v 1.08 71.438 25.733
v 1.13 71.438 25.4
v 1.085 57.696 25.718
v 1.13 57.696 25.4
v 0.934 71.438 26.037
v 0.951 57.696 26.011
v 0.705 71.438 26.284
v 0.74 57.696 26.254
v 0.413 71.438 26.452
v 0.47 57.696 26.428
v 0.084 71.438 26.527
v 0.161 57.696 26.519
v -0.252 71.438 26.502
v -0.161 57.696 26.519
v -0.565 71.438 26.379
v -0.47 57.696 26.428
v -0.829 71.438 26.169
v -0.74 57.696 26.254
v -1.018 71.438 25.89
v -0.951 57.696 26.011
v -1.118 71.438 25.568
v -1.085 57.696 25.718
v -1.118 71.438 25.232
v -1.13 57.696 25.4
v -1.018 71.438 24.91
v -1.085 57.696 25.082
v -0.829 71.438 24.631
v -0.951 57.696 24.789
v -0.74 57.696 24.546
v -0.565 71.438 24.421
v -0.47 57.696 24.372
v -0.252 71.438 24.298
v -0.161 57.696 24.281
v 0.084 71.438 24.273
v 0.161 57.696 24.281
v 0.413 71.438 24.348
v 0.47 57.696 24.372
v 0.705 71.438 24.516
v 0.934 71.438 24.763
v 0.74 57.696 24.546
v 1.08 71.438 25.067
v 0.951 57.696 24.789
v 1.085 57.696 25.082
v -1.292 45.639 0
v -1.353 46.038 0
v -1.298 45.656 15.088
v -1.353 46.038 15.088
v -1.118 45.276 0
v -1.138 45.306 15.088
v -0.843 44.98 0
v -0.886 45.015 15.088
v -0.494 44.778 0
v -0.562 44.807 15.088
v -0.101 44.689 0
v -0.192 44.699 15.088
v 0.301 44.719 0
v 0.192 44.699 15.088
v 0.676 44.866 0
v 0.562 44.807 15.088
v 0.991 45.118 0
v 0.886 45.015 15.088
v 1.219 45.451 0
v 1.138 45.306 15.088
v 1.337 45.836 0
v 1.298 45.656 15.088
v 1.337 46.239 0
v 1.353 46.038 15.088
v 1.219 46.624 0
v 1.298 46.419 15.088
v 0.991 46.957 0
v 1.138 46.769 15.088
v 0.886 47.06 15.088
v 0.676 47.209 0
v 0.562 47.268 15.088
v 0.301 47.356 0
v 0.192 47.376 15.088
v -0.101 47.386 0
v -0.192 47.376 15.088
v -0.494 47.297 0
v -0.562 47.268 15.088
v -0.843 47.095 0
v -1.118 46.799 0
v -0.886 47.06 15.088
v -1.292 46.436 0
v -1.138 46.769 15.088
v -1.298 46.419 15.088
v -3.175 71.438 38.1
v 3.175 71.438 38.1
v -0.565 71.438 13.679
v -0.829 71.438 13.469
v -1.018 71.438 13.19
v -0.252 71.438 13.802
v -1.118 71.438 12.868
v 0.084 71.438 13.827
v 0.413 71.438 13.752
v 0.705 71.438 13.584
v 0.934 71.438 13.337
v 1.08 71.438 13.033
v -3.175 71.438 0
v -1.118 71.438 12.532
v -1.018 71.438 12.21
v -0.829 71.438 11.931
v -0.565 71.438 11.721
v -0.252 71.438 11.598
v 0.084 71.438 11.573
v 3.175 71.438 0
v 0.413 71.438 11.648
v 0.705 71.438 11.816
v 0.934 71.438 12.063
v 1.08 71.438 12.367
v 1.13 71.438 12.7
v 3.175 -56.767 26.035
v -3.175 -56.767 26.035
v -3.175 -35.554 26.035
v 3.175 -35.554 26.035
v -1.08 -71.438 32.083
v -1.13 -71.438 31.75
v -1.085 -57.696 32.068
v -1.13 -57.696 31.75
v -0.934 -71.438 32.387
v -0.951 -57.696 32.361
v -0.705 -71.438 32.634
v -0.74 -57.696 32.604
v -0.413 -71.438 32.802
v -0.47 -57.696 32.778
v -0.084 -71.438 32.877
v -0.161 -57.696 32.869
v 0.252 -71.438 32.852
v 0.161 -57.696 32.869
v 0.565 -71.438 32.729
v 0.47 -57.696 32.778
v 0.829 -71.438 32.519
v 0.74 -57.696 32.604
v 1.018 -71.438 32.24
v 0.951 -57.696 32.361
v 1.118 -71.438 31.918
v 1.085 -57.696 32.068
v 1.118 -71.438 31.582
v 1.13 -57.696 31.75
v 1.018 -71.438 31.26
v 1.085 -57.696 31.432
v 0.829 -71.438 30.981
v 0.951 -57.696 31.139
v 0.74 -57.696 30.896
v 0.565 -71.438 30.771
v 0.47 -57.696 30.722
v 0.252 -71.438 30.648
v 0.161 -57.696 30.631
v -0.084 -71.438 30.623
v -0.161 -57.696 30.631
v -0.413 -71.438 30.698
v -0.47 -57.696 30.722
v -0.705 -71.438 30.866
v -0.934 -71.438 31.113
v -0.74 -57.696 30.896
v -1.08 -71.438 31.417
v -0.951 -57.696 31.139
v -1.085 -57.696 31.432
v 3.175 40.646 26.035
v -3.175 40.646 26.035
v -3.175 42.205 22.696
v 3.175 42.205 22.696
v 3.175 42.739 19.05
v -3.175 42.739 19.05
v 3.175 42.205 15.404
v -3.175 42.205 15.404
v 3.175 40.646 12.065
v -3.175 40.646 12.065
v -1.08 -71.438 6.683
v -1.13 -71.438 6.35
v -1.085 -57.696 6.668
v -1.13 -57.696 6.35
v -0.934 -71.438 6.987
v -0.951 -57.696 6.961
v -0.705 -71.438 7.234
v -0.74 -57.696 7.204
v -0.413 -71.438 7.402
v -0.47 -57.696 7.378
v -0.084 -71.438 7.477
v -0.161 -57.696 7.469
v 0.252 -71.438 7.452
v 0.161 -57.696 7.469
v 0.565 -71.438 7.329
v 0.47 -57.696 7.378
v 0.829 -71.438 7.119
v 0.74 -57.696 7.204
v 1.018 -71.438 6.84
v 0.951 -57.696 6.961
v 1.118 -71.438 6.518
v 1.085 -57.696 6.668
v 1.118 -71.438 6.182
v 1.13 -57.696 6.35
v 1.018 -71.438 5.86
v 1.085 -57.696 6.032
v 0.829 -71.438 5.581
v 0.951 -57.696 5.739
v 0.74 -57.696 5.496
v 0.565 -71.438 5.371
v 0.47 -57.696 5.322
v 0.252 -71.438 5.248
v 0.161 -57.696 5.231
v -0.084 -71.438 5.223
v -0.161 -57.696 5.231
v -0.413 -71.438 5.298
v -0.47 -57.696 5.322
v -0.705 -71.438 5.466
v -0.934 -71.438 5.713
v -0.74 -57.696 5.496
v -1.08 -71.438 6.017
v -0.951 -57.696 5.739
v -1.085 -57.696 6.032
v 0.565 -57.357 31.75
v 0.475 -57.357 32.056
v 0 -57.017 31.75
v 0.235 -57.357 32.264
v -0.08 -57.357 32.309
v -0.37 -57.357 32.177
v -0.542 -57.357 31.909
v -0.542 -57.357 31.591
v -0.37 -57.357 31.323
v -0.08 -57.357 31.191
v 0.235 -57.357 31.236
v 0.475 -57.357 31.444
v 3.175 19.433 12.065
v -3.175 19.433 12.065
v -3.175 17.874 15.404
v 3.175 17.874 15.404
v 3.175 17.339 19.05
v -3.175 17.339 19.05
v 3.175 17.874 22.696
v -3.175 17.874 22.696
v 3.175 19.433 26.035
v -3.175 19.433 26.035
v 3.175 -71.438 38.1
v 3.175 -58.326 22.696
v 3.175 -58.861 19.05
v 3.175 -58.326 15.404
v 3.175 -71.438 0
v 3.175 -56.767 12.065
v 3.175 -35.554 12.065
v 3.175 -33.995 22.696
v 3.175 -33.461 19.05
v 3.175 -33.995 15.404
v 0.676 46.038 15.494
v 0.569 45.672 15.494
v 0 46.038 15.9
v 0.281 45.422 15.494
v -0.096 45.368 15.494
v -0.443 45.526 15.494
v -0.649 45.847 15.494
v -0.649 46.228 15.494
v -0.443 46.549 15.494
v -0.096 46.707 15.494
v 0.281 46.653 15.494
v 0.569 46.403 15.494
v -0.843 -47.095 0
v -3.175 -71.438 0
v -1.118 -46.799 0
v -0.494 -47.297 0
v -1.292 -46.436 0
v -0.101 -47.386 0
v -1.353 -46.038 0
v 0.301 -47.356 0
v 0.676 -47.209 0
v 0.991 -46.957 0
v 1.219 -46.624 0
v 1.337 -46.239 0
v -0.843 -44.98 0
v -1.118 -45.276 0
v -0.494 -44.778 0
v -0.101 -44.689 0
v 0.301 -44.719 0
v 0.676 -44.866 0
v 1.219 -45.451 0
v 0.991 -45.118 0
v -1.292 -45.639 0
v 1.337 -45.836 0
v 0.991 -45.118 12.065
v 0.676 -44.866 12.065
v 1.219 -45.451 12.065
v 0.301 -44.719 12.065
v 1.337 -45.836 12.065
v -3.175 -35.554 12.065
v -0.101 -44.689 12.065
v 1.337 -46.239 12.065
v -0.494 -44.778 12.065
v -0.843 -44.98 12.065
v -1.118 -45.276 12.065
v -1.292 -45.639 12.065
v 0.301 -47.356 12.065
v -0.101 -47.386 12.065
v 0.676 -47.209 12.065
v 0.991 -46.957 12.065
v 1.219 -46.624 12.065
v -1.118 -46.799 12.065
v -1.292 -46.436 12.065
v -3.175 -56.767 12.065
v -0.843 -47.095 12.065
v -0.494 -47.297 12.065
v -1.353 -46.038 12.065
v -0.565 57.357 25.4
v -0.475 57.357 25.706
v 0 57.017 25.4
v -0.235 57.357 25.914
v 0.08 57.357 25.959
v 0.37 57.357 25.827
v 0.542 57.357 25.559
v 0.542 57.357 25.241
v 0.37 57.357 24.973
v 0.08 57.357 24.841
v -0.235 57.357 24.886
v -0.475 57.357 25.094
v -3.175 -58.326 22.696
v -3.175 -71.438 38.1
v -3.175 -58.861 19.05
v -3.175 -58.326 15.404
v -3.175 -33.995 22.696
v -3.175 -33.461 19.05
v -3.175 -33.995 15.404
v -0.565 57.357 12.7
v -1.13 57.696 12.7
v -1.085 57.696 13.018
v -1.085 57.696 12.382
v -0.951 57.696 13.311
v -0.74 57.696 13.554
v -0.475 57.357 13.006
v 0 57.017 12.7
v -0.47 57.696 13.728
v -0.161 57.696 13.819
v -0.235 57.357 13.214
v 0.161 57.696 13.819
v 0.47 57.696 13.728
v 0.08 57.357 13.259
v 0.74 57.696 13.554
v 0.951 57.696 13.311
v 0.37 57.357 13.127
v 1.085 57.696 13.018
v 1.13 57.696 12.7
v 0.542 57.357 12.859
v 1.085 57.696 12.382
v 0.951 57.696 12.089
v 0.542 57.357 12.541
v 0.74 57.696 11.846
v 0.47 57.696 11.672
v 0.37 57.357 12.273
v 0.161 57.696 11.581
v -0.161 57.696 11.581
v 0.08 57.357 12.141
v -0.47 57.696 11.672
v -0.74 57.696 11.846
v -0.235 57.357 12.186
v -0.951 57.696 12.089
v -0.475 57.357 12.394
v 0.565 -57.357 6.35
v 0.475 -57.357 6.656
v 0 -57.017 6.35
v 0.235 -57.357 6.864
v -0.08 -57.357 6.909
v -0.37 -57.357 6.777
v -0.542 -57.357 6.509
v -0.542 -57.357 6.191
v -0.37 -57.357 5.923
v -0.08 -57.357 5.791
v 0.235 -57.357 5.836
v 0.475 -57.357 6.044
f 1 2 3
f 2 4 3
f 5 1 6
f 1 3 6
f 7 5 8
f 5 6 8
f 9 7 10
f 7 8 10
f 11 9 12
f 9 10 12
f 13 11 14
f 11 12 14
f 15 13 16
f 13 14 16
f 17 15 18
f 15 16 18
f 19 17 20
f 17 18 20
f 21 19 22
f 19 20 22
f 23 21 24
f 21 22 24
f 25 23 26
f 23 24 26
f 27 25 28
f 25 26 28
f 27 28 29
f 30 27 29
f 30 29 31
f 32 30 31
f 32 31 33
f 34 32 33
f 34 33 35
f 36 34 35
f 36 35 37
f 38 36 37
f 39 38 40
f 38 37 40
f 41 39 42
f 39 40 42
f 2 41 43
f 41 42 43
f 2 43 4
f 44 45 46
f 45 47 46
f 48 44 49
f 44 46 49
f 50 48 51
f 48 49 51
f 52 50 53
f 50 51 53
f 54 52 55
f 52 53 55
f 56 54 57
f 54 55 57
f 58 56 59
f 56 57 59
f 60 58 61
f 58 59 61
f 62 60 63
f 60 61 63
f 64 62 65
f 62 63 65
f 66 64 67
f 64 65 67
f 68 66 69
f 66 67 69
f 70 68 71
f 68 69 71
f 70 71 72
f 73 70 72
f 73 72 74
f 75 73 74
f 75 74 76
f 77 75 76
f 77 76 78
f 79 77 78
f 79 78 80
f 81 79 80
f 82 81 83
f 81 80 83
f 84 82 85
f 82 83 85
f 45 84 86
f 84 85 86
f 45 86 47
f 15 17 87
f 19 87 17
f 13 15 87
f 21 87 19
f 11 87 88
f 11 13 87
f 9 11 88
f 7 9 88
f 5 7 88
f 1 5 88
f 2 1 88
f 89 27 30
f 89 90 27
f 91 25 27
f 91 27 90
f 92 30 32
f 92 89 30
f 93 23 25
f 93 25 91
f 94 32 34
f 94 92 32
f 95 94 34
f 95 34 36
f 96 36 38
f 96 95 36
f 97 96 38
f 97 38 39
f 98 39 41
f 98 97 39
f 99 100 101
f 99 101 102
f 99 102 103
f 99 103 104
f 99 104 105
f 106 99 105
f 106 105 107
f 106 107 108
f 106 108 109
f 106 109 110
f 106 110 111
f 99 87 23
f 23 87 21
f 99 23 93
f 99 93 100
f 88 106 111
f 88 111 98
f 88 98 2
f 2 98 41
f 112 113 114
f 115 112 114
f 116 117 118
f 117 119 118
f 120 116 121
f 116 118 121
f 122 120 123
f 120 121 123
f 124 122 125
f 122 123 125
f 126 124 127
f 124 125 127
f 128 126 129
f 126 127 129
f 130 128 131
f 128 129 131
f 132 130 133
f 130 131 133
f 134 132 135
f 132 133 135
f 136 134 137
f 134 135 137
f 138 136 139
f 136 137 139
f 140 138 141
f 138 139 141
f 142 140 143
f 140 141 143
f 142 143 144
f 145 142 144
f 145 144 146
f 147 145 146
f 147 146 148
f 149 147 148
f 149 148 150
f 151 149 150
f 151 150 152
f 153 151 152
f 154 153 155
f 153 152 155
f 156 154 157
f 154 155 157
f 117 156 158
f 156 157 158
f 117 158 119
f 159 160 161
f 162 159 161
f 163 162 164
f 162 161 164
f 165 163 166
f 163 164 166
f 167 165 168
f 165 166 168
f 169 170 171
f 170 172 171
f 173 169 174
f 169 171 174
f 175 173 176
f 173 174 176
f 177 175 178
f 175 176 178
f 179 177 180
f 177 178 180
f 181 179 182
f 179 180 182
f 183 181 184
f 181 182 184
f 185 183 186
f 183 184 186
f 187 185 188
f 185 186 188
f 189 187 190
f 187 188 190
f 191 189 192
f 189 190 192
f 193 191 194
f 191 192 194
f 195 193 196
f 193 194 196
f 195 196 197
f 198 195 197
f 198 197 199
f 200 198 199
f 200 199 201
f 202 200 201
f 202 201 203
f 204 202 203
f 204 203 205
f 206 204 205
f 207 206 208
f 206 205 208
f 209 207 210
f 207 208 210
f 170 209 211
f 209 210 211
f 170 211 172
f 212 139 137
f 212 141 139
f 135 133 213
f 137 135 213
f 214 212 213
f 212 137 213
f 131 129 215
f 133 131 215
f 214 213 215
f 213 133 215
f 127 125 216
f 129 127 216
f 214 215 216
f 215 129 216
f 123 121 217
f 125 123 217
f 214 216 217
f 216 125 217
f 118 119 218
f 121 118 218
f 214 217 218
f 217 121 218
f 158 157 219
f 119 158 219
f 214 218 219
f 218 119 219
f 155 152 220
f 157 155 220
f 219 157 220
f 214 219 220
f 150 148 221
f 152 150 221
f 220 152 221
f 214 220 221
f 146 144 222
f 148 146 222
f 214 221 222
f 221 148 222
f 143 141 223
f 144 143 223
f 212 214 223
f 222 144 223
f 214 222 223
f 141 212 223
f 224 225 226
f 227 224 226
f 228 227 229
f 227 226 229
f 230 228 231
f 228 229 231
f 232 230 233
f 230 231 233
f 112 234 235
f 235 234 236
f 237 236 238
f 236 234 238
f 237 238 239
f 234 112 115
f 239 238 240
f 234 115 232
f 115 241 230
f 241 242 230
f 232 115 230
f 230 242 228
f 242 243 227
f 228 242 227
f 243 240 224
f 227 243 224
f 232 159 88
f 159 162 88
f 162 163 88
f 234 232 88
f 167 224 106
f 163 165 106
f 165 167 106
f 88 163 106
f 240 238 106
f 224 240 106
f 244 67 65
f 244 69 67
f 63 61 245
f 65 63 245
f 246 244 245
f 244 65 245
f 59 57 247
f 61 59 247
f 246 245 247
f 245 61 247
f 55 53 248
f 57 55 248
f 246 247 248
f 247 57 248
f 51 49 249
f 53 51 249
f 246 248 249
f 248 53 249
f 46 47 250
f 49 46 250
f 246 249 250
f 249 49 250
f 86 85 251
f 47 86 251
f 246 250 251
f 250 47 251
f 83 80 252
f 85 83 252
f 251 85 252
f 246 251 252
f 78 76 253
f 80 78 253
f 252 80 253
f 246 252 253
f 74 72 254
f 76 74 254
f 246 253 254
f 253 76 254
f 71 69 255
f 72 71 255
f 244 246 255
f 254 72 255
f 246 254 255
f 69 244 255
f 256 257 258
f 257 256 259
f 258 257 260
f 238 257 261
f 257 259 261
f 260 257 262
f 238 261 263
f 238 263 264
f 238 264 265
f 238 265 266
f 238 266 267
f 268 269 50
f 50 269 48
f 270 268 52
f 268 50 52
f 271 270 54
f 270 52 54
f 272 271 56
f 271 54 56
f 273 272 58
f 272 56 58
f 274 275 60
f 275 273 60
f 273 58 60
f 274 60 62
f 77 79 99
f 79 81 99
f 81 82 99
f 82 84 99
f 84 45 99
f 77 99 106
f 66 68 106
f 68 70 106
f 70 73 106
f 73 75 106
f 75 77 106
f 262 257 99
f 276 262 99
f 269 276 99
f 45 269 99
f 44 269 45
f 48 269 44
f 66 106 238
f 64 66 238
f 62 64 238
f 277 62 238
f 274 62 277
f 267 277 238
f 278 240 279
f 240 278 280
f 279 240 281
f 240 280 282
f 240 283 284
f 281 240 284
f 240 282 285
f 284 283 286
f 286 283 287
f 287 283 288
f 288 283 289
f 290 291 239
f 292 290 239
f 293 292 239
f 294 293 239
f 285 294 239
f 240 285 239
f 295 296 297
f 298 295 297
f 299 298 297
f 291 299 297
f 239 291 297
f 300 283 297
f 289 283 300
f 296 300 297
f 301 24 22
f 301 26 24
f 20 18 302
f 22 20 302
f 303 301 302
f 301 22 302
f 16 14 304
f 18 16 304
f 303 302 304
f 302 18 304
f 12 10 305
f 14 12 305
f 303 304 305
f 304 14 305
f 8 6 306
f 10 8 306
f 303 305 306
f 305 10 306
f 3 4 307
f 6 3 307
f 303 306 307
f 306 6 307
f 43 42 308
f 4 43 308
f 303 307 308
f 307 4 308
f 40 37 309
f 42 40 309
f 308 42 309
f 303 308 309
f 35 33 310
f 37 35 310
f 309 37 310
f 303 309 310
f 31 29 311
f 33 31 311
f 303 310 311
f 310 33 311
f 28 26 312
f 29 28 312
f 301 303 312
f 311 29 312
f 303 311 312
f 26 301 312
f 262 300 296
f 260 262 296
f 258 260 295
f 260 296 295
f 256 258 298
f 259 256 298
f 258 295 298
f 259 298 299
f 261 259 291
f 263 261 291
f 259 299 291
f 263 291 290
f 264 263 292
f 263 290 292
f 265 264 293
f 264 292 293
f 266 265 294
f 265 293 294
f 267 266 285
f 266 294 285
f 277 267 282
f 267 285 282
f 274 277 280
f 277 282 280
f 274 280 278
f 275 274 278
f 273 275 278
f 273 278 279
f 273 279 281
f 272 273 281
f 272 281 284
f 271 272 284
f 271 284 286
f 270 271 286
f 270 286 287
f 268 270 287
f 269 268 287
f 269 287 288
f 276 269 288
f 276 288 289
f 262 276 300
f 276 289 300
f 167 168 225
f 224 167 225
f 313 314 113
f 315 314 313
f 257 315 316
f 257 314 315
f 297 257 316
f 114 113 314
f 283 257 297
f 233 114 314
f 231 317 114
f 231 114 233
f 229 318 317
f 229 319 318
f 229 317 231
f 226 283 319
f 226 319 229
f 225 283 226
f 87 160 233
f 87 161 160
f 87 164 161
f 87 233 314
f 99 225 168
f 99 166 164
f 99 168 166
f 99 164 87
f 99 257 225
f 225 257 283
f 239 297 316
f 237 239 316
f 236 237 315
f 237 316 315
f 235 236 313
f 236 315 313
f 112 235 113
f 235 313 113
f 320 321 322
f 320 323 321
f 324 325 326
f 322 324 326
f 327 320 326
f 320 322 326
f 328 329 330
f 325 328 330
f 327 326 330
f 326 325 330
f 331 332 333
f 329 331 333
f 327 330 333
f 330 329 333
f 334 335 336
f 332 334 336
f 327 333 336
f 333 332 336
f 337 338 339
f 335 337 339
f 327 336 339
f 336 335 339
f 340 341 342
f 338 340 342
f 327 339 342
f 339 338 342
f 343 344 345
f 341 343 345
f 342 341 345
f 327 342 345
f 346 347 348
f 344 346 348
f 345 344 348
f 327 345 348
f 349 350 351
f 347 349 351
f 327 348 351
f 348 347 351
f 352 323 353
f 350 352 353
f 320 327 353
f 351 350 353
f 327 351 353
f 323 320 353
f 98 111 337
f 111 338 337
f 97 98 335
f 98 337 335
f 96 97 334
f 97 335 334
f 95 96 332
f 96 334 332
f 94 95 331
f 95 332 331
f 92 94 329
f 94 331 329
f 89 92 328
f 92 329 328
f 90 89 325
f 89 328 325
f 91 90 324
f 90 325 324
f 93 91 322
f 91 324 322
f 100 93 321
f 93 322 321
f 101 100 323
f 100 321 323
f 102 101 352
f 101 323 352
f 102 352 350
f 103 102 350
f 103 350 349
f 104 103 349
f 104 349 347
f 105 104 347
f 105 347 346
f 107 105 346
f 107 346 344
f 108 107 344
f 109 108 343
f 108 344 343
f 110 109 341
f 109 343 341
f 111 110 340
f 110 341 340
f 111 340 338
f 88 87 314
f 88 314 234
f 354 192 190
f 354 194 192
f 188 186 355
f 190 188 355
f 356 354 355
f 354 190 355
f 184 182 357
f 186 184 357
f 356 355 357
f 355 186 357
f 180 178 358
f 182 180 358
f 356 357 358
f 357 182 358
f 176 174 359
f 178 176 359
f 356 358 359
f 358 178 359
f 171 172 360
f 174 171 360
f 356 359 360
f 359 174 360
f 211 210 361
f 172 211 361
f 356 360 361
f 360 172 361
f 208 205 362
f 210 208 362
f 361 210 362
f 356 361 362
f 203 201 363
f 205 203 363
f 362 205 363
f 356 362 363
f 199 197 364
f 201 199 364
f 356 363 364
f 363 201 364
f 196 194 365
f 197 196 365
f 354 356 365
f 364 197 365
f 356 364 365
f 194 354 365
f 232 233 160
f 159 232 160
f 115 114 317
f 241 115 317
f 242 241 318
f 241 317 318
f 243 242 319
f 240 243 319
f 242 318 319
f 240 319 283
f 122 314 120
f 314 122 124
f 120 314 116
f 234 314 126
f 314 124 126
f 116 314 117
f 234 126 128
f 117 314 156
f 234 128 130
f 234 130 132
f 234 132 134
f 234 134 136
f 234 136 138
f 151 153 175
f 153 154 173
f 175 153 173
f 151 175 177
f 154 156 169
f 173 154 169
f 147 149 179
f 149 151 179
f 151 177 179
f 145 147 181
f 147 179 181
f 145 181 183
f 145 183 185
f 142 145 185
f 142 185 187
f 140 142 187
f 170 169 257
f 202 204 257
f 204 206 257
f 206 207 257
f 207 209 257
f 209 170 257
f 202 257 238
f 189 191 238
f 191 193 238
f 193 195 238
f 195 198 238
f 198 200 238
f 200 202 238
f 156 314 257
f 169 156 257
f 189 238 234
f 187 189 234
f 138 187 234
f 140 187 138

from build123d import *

# Parameters (mm, degrees)
F0_W           = 6.35
F0_H           = 142.875
F1_DEPTH       = 38.1
F3_D           = 2.7051
F3_DEPTH       = 15.0876
F3_TIP         = 0.8126940303
F6_D           = 2.2606
F6_DEPTH       = 13.7414
F6_TIP         = 0.6791527577
F6_ON_F4_D     = 2.2606
F6_ON_F4_DEPTH = 13.7414
F6_ON_F4_TIP   = 0.6791527577
F8_DEPTH       = 25.4


with BuildPart() as f1:
    # F0 (on Top) → F1 (new body)
    with BuildSketch(Plane.XY):
        Rectangle(F0_W, F0_H)
    extrude(amount=F1_DEPTH)

    # F3
    with Locations(Plane(origin=(0, 0, 0), x_dir=(1, 0, 0), z_dir=(0, 0, -1))):
        with Locations((0, 46.0375), (0, -46.0375)):
            Hole(F3_D / 2, depth=F3_DEPTH)
            with Locations((0, 0, -(F3_DEPTH + F3_TIP / 2))):  # 118° drill point
                Cone(0, F3_D / 2, F3_TIP, mode=Mode.SUBTRACT)

    # F6
    with Locations(Plane.XZ.offset(71.4375)):
        with Locations((0, 31.75), (0, 6.35)):
            Hole(F6_D / 2, depth=F6_DEPTH)
            with Locations((0, 0, -(F6_DEPTH + F6_TIP / 2))):  # 118° drill point
                Cone(0, F6_D / 2, F6_TIP, mode=Mode.SUBTRACT)

    # F6 on F4
    with Locations(Plane(origin=(0, 71.4375, 0), x_dir=(-1, 0, 0), z_dir=(0, 1, 0))):
        with Locations((0, 25.4), (0, 12.7)):
            Hole(F6_ON_F4_D / 2, depth=F6_ON_F4_DEPTH)
            with Locations((0, 0, -(F6_ON_F4_DEPTH + F6_ON_F4_TIP / 2))):  # 118° drill point
                Cone(0, F6_ON_F4_D / 2, F6_ON_F4_TIP, mode=Mode.SUBTRACT)

    # F7 (on face) → F8 (cut)
    with BuildSketch(Plane(origin=(-3.175, 0, 0), x_dir=(0, -1, 0), z_dir=(-1, 0, 0))):
        with BuildLine():
            Line((-19.4328204888, 26.035), (-40.6460027112, 26.035))
            ThreePointArc((-40.6460027112, 26.035), (-42.7394116, 19.05), (-40.6460027112, 12.065))
            Line((-40.6460027112, 12.065), (-19.4328204888, 12.065))
            ThreePointArc((-19.4328204888, 12.065), (-17.3394116, 19.05), (-19.4328204888, 26.035))
        make_face()
        with BuildLine():
            Line((35.5539972888, 12.065), (56.7671795112, 12.065))
            ThreePointArc((56.7671795112, 12.065), (58.8605884, 19.05), (56.7671795112, 26.035))
            Line((56.7671795112, 26.035), (35.5539972888, 26.035))
            ThreePointArc((35.5539972888, 26.035), (33.4605884, 19.05), (35.5539972888, 12.065))
        make_face()
    extrude(amount=-F8_DEPTH, mode=Mode.SUBTRACT)


solid = f1.part
